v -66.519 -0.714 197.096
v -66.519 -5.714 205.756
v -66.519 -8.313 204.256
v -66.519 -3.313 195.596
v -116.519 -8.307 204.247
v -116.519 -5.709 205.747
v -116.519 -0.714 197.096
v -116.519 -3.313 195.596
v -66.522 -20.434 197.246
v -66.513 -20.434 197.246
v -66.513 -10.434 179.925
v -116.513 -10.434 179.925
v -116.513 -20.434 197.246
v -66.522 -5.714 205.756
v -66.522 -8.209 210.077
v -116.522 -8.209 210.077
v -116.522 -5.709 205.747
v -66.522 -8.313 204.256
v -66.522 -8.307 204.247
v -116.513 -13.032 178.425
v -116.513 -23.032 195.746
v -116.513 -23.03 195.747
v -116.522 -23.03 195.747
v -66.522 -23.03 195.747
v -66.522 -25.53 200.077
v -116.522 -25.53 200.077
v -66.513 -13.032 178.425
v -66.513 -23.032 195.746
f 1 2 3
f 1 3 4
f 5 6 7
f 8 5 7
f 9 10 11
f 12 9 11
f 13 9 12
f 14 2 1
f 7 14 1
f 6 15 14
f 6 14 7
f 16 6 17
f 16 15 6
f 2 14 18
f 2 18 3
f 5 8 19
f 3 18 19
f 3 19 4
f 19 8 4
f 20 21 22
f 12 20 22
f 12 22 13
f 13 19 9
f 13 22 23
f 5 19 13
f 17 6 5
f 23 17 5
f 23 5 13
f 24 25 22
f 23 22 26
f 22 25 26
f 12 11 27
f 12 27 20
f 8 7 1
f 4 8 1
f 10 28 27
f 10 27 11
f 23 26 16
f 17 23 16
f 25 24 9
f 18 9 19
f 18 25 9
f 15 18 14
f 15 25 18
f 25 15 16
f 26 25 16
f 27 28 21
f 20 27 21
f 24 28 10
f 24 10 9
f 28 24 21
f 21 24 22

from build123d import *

# Parameters (mm, degrees)
SKETCH060_W             = 50
SKETCH060_H             = 20
PAD059_DEPTH            = 5
SKETCH061_W             = 50
SKETCH061_H             = 3
PAD060_DEPTH            = 20
SKETCH062_W             = 50
SKETCH062_H             = 10
PAD061_DEPTH            = 3
BODY044_ROLL_ANGLE      = 150
BODY044_PLACEMENT_ANGLE = 180


with BuildPart() as part:
    # Sketch060 → Pad059 (new body)
    with BuildSketch(Plane.XY):
        with Locations((184.845276, -123.914059)):
            Rectangle(SKETCH060_W, SKETCH060_H)
    extrude(amount=PAD059_DEPTH)

    # Sketch061 (on Face6 of Pad059) → Pad060 (join)
    with BuildSketch(Plane.XY.offset(5)):
        with Locations((184.83606, -132.417099)):
            Rectangle(SKETCH061_W, SKETCH061_H)
    extrude(amount=PAD060_DEPTH)

    # Sketch062 (on Face7 of Pad060) → Pad061 (join)
    with BuildSketch(Plane(origin=(0, -113.914059, 0), x_dir=(-1, 0, 0), z_dir=(0, 1, 0))):
        with Locations((-184.841869, 9.989668)):
            Rectangle(SKETCH062_W, SKETCH062_H)
    extrude(amount=-PAD061_DEPTH)


with BuildPart() as part_1:
    # Body044 roll: moved
    add(part.part.rotate(Axis((0, 0, 0), (1, 0, 0)), BODY044_ROLL_ANGLE))


with BuildPart() as part_2:
    # Body044 placement: moved
    add(part_1.part.moved(Location((93.323153, 90.443186, 267.034204))).rotate(Axis((93.323153, 90.443186, 267.034204), (0, 0, 1)), BODY044_PLACEMENT_ANGLE))


solid = part_2.part
